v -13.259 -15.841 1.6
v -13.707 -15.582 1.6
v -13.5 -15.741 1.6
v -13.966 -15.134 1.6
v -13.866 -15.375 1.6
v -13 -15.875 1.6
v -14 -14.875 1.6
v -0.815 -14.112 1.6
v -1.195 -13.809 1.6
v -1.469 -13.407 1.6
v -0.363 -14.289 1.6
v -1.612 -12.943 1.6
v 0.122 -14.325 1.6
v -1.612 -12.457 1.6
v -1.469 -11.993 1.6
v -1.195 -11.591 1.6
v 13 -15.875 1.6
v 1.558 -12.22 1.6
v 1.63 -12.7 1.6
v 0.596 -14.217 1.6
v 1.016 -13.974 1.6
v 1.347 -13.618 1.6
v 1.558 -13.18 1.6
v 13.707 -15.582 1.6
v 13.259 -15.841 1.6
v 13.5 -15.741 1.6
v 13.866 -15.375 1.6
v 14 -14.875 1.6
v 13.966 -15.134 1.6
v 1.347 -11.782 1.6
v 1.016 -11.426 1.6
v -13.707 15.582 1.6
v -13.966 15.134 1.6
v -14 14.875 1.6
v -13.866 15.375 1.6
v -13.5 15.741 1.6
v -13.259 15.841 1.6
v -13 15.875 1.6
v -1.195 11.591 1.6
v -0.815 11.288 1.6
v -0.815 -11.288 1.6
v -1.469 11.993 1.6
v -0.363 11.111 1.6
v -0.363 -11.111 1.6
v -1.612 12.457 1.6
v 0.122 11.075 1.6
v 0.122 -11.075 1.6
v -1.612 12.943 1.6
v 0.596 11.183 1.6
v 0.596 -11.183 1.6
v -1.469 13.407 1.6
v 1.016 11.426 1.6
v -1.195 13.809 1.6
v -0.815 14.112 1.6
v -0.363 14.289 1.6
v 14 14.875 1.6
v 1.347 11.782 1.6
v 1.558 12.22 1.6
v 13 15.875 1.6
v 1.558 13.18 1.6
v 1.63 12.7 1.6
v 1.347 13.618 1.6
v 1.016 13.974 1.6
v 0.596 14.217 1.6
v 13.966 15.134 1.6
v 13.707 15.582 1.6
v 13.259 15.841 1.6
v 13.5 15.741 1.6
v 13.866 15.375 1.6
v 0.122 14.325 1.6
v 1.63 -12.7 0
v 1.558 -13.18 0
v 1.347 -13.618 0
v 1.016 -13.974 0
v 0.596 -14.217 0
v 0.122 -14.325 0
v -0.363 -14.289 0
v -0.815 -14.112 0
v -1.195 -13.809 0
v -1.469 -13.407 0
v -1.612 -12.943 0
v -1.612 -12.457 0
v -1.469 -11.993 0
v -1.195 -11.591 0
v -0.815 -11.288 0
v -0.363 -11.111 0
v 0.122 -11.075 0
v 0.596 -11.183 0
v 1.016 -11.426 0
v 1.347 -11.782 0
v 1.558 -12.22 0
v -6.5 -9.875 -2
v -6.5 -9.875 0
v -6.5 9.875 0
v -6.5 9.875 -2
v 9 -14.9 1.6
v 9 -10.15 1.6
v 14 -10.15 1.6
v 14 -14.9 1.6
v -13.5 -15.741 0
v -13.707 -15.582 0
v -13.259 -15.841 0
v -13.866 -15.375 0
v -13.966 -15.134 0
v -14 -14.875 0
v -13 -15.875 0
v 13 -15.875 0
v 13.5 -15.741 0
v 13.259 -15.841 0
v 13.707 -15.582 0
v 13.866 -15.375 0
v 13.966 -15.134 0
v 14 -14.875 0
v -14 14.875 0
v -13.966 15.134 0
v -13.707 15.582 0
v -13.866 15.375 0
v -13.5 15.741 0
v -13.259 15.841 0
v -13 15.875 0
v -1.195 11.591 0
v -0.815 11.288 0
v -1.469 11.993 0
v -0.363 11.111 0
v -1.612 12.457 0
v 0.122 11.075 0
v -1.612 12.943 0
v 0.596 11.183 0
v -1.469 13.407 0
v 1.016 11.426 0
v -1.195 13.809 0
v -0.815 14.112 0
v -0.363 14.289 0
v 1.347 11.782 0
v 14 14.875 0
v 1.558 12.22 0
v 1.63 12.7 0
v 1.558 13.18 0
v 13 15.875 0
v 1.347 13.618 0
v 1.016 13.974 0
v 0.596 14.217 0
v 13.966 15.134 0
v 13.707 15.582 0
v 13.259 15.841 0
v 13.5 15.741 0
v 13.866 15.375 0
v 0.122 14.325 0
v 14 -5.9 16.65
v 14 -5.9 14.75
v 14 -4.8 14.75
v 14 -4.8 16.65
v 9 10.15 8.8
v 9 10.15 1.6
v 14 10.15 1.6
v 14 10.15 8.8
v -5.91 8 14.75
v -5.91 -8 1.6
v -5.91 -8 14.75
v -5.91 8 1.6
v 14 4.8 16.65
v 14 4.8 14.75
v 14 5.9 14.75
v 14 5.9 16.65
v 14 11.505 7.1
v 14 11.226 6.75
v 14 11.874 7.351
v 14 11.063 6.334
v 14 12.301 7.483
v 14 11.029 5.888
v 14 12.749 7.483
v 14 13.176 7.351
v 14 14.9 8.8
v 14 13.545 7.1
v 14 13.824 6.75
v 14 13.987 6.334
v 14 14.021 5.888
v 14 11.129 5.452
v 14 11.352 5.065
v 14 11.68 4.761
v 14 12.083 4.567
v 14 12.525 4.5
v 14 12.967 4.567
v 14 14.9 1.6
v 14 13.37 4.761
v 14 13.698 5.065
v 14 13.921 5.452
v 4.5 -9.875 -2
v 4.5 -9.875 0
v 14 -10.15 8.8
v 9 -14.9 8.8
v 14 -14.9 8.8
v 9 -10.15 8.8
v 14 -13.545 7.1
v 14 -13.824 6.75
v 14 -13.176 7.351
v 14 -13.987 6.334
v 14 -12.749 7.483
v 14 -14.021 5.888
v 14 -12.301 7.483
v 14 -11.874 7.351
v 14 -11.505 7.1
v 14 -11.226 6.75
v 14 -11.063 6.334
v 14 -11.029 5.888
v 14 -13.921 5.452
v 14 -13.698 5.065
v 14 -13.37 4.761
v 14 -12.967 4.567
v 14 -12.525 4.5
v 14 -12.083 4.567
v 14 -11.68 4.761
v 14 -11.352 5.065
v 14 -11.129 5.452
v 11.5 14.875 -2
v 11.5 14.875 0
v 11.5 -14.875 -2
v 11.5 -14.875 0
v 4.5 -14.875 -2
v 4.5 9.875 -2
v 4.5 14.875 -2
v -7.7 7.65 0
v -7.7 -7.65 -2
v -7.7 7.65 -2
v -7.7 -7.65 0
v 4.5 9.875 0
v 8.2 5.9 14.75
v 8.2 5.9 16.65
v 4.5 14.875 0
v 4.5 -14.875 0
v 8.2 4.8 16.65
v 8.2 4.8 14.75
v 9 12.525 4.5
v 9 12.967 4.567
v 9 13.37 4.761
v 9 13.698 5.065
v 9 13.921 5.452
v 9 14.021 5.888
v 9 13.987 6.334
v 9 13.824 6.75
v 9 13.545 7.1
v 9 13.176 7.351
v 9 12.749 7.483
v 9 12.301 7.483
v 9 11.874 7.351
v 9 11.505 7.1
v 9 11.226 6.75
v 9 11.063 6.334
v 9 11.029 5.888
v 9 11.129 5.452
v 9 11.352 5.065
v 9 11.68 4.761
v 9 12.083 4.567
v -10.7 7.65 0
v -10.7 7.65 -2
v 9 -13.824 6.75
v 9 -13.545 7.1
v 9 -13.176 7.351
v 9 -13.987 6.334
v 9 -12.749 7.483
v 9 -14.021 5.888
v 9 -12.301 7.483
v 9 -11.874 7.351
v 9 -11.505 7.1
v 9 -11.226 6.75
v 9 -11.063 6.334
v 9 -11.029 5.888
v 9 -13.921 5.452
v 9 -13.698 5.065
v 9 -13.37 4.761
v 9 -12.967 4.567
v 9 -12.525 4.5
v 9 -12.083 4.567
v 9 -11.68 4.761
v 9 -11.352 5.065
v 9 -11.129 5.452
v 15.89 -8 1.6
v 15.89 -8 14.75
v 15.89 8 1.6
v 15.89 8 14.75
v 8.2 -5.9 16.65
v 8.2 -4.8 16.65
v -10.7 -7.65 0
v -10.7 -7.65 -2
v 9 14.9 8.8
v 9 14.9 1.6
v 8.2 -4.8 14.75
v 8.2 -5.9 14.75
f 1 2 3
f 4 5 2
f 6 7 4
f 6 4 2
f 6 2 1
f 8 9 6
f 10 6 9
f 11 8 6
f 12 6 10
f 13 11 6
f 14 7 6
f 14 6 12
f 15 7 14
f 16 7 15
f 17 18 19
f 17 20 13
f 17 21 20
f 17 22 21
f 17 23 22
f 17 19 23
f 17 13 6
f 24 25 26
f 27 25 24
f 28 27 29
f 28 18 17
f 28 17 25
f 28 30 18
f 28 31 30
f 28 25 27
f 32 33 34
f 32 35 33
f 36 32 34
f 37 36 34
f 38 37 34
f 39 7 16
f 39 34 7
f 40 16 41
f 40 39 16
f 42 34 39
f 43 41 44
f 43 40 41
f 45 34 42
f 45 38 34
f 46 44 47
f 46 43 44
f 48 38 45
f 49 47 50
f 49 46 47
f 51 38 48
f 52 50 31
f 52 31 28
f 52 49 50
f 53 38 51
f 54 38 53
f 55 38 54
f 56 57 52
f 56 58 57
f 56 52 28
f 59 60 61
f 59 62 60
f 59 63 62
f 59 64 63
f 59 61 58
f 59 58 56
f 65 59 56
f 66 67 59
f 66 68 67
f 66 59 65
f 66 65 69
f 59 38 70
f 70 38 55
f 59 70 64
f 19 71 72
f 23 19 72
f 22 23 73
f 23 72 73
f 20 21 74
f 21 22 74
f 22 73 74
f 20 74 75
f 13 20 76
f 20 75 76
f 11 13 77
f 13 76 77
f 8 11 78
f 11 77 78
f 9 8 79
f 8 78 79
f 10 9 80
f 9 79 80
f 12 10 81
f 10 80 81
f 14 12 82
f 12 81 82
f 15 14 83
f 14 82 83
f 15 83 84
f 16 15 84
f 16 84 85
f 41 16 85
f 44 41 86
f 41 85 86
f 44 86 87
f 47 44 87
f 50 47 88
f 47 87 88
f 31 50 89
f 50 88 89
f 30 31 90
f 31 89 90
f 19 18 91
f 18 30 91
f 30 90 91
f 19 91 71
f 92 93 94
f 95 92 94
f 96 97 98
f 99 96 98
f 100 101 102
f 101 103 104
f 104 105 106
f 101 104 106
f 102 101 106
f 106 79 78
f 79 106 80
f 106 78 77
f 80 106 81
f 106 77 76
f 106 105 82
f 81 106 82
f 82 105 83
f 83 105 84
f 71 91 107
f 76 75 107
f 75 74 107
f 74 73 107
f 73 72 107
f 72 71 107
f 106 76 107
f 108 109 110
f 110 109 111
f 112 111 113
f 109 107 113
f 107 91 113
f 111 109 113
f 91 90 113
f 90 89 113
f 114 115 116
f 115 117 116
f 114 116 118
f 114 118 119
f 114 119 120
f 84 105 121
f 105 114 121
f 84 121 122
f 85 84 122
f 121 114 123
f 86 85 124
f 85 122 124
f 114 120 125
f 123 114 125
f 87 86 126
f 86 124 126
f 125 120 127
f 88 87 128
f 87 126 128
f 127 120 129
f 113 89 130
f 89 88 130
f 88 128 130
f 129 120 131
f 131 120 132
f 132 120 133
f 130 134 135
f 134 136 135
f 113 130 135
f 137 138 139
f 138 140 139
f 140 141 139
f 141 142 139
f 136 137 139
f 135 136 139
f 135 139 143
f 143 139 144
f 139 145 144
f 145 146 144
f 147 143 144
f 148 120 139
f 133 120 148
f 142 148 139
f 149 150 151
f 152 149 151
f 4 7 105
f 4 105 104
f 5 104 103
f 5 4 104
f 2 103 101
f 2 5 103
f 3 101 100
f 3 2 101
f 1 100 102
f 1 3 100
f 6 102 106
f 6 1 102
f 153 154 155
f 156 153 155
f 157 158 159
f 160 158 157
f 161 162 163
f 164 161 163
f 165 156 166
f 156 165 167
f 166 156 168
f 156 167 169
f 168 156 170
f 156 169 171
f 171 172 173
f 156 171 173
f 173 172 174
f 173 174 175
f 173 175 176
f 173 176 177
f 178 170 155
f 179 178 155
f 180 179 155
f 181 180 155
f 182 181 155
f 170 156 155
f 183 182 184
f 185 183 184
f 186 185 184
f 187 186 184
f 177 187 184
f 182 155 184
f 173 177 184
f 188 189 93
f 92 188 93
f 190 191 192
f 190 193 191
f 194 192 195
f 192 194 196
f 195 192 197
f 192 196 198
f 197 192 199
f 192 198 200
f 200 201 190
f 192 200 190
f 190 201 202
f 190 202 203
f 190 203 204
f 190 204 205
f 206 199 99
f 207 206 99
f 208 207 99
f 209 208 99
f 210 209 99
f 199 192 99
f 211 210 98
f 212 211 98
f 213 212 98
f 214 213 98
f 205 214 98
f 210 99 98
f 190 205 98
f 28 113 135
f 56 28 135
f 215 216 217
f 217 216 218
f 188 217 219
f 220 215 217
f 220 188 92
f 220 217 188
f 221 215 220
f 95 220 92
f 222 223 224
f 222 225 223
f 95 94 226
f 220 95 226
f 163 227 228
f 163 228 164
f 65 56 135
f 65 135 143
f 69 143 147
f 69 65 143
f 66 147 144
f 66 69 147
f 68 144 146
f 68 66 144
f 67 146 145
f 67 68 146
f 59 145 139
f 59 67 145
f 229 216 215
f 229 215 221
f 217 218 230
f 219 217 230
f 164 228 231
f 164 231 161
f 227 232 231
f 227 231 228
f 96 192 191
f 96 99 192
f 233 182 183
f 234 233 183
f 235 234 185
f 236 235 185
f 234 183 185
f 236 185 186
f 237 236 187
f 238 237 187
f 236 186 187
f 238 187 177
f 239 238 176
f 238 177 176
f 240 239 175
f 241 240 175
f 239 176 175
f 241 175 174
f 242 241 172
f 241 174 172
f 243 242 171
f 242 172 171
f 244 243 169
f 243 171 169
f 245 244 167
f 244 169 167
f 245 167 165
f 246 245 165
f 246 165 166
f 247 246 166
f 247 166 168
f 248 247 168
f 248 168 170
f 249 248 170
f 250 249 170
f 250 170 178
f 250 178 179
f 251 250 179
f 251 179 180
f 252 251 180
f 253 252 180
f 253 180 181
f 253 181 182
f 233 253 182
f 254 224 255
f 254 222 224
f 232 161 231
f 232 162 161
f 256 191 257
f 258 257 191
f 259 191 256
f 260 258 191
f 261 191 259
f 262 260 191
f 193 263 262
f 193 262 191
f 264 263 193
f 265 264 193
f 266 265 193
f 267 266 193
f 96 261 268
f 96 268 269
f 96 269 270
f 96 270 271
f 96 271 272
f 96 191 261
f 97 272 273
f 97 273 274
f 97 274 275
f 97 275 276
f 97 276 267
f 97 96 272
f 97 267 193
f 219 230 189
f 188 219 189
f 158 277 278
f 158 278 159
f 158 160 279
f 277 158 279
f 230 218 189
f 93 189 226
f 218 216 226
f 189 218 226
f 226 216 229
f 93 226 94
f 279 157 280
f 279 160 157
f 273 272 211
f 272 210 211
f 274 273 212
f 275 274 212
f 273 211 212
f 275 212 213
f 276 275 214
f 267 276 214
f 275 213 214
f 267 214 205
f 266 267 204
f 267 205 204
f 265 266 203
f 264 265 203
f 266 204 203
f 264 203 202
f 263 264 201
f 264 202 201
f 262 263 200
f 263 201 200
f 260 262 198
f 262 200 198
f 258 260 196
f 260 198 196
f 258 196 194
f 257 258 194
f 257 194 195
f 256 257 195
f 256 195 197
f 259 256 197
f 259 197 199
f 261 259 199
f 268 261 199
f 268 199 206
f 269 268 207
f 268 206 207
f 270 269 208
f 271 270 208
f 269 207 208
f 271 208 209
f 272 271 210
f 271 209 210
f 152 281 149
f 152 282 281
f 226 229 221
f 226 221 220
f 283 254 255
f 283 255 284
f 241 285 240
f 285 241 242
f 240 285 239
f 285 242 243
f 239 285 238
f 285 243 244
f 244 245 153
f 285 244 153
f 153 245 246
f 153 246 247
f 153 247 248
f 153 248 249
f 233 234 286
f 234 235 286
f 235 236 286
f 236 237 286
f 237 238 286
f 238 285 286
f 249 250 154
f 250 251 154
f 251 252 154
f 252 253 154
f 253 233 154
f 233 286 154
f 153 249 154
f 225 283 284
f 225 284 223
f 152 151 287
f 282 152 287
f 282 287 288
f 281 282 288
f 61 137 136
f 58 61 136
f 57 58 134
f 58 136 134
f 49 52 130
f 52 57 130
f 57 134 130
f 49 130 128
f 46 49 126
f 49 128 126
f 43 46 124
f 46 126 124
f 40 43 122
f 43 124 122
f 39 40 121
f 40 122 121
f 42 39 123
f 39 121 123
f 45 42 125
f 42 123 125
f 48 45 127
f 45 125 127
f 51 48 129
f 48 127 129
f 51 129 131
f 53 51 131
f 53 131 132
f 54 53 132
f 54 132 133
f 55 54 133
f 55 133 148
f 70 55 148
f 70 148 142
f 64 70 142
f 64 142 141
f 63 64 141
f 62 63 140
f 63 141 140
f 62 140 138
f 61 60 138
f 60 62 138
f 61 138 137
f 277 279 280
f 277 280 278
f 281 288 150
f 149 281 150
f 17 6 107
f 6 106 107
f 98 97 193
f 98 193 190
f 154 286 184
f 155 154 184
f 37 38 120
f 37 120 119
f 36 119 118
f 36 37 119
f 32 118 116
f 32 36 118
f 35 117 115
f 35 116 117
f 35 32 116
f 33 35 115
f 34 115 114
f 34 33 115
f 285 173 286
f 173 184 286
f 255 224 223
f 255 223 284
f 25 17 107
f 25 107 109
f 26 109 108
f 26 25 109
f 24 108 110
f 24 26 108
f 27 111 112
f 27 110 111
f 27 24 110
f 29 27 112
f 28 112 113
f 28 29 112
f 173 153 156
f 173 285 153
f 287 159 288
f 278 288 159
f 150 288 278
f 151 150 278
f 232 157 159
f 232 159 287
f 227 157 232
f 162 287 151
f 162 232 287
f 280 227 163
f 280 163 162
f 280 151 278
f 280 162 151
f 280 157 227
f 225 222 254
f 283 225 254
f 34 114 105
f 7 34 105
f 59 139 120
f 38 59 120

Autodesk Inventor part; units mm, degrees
ref_plane "YZ Plane" through (0, 0, 0) normal (1, 0, 0) x (0, 1, 0)
ref_plane "XZ Plane" through (0, 0, 0) normal (0, 1, 0) x (-1, 0, 0)
ref_plane "XY Plane" through (0, 0, 0) normal (0, 0, 1) x (1, 0, 0)
sketch "Sketch1" plane through (0, 0, 0) normal (0, 0, 1) x (1, 0, 0)
  line L0 (-14, -15.875) -> (14, -15.875)
  line L1 (14, -15.875) -> (14, 15.875)
  line L2 (14, 15.875) -> (-14, 15.875)
  line L3 (-14, 15.875) -> (-14, -15.875)
  line L4 (-14, -15.875) -> (14, 15.875) construction
  line L5 (14, -15.875) -> (-14, 15.875) construction
  line L6 (0, 22.225) -> (0, -22.225) construction
  circle A0 centre (0, 12.7) radius 1.63
  line L7 (-19.6, 0) -> (19.6, 0) construction
  circle A1 centre (0, -12.7) radius 1.63
  point P0 (0, 0)
  dimension "d0" = 28
  dimension "d1" = 31.75
  dimension "d2" = 25.4
  dimension "d3" = 3.26
extrude "Extrusion1" add sketch "Sketch1" along normal blind 1.6
sketch "Sketch2" plane through (0, 0, 1.6) normal (0, 0, 1) x (1, 0, 0)
  line L0 (-19.978, 0) -> (21.868, 0) projected
  line L1 (-5.91, 8) -> (15.89, 8)
  line L2 (15.89, 8) -> (15.89, -8)
  line L3 (15.89, -8) -> (-5.91, -8)
  line L4 (-5.91, -8) -> (-5.91, 8)
  line L5 (-5.91, 8) -> (15.89, -8) construction
  line L6 (15.89, 8) -> (-5.91, -8) construction
  line L7 (14, -15.875) -> (14, 15.875) projected
  point P0 (0, 0)
  point P1 (4.99, 0)
  point P2 (14, -8)
  point P3 (14, 8)
  dimension "d6" = 16
  dimension "d7" = 21.8
  dimension "d8" = 1.89
extrude "Extrusion2" add sketch "Sketch2" along normal blind 13.15 separate body
sketch "Sketch3" plane through (0, 0, 14.75) normal (0, 0, 1) x (1, 0, 0)
  line L0 (14, 8) -> (-5.91, 8) projected
  line L1 (-5.91, 8) -> (-5.91, -8) projected
  line L2 (-5.91, -8) -> (14, -8) projected
  line L3 (14, -8) -> (14, 8) projected
  line L4 (14, -4.8) -> (8.2, -4.8)
  line L5 (8.2, -4.8) -> (8.2, -5.9)
  line L6 (8.2, -5.9) -> (14, -5.9)
  line L7 (14, -5.9) -> (14, -4.8)
  line L8 (-19.978, 0) -> (21.868, 0) projected
  line L9 (14, 4.8) -> (8.2, 4.8)
  line L10 (8.2, 4.8) -> (8.2, 5.9)
  line L11 (8.2, 5.9) -> (14, 5.9)
  line L12 (14, 5.9) -> (14, 4.8)
  point P0 (0, 0)
  dimension "d11" = 5.8
  dimension "d12" = 3.2
  dimension "d13" = 1.1
extrude "Extrusion3" add sketch "Sketch3" along normal blind 1.9 contours L3 L9 L10 L11 | L3 L6 L5 L4 bodies 2
sketch "Sketch4" plane through (0, 0, 1.6) normal (0, 0, 1) x (1, 0, 0)
  circle A0 centre (0, -12.7) radius 1.63 projected
  circle A1 centre (0, 12.7) radius 1.63 projected
  line L0 (14, -15.875) -> (14, 15.875) projected
  line L1 (14, 15.875) -> (-14, 15.875) projected
  line L2 (-14, 15.875) -> (-14, -15.875) projected
  line L3 (-14, -15.875) -> (14, -15.875) projected
  line L4 (14, -14.9) -> (9, -14.9)
  line L5 (9, -14.9) -> (9, -10.15)
  line L6 (9, -10.15) -> (14, -10.15)
  line L7 (14, -10.15) -> (14, -14.9)
  line L8 (-19.6, 0) -> (19.6, 0) projected
  line L9 (14, 14.9) -> (9, 14.9)
  line L10 (9, 14.9) -> (9, 10.15)
  line L11 (9, 10.15) -> (14, 10.15)
  line L12 (14, 10.15) -> (14, 14.9)
  point P0 (0, 0)
  point P1 (14, 12.525)
  point P2 (14, -12.525)
  dimension "d16" = 4.75
  dimension "d18" = 25.05
extrude "Extrusion4" add sketch "Sketch4" along normal blind 7.2 separate body contours L4 L5 L6 L0 | L11 L10 L9 L0
sketch "Sketch5" plane through (14, -15.875, 0) normal (1, 0, 0) x (0, 0, -1)
  line L0 (-8.8, 3.35) -> (-3.1193, 3.35) construction
  line L1 (-19.98, 15.875) -> (3.33, 15.875) projected
  circle A0 centre (-6, 3.35) radius 1.5
  line L2 (-1.6, 0) -> (-1.6, 31.75) projected
  circle A1 centre (-6, 28.4) radius 1.5
  line L3 (-8.8, 0.975) -> (-8.8, 5.725) projected
  point P0 (0, 15.875)
  point P1 (-1.6, 5.725)
  point P2 (-1.6, 7.875)
  point P3 (-1.6, 26.025)
  dimension "d21" = 3
  dimension "d22" = 4.4
extrude "Extrusion5" cut sketch "Sketch5" against normal blind 7.2 bodies 3
sketch "Sketch6" plane through (0, 0, 0) normal (0, 0, -1) x (-1, 0, 0)
  line L0 (-19.6, 0) -> (19.6, 0) construction
  line L1 (7.7, 7.65) -> (10.7, 7.65)
  line L2 (10.7, 7.65) -> (10.7, -7.65)
  line L3 (10.7, -7.65) -> (7.7, -7.65)
  line L4 (7.7, -7.65) -> (7.7, 7.65)
  line L5 (7.7, 7.65) -> (10.7, -7.65) construction
  line L6 (10.7, 7.65) -> (7.7, -7.65) construction
  line L7 (14, 15.875) -> (14, -15.875) projected
  point P0 (0, 0)
  point P1 (9.2, 0)
  dimension "d25" = 15.3
  dimension "d26" = 3
  dimension "d27" = 3.3
extrude "Extrusion6" add sketch "Sketch6" along normal blind 2 separate body
sketch "Sketch7" plane through (0, 0, 0) normal (0, 0, -1) x (-1, 0, 0)
  line L0 (-19.6, 0) -> (19.6, 0) construction
  line L1 (6.5, 9.875) -> (-11.5, 9.875)
  line L2 (-11.5, 9.875) -> (-11.5, -9.875)
  line L3 (-11.5, -9.875) -> (6.5, -9.875)
  line L4 (6.5, -9.875) -> (6.5, 9.875)
  line L5 (6.5, 9.875) -> (-11.5, -9.875) construction
  line L6 (-11.5, 9.875) -> (6.5, -9.875) construction
  line L7 (-4.5, -9.875) -> (-11.5, -9.875)
  line L8 (-11.5, -9.875) -> (-11.5, -14.875)
  line L9 (-11.5, -14.875) -> (-4.5, -14.875)
  line L10 (-4.5, -14.875) -> (-4.5, -9.875)
  line L11 (-4.5, 9.875) -> (-11.5, 9.875)
  line L12 (-11.5, 9.875) -> (-11.5, 14.875)
  line L13 (-11.5, 14.875) -> (-4.5, 14.875)
  line L14 (-4.5, 14.875) -> (-4.5, 9.875)
  line L15 (14, -15.875) -> (-14, -15.875) projected
  line L16 (-14, -15.875) -> (-14, 15.875) projected
  point P0 (0, 0)
  point P1 (-2.5, 0)
  point P2 (-11.5, 9.875)
  dimension "d30" = 1
  dimension "d31" = 2.5
  dimension "d32" = 2.5
  dimension "d33" = 5
  dimension "d34" = 7
  dimension "d35" = 18
extrude "Extrusion7" add sketch "Sketch7" along normal blind 2 separate body
fillet "Fillet1" radius 1 4 edges at (14, 15.875, 0.8) (-14, 15.875, 0.8) (-14, -15.875, 0.8) (14, -15.875, 0.8)
equation "\"d32\" = d31"
properties part number "EGPL-T101-C1_DB"
